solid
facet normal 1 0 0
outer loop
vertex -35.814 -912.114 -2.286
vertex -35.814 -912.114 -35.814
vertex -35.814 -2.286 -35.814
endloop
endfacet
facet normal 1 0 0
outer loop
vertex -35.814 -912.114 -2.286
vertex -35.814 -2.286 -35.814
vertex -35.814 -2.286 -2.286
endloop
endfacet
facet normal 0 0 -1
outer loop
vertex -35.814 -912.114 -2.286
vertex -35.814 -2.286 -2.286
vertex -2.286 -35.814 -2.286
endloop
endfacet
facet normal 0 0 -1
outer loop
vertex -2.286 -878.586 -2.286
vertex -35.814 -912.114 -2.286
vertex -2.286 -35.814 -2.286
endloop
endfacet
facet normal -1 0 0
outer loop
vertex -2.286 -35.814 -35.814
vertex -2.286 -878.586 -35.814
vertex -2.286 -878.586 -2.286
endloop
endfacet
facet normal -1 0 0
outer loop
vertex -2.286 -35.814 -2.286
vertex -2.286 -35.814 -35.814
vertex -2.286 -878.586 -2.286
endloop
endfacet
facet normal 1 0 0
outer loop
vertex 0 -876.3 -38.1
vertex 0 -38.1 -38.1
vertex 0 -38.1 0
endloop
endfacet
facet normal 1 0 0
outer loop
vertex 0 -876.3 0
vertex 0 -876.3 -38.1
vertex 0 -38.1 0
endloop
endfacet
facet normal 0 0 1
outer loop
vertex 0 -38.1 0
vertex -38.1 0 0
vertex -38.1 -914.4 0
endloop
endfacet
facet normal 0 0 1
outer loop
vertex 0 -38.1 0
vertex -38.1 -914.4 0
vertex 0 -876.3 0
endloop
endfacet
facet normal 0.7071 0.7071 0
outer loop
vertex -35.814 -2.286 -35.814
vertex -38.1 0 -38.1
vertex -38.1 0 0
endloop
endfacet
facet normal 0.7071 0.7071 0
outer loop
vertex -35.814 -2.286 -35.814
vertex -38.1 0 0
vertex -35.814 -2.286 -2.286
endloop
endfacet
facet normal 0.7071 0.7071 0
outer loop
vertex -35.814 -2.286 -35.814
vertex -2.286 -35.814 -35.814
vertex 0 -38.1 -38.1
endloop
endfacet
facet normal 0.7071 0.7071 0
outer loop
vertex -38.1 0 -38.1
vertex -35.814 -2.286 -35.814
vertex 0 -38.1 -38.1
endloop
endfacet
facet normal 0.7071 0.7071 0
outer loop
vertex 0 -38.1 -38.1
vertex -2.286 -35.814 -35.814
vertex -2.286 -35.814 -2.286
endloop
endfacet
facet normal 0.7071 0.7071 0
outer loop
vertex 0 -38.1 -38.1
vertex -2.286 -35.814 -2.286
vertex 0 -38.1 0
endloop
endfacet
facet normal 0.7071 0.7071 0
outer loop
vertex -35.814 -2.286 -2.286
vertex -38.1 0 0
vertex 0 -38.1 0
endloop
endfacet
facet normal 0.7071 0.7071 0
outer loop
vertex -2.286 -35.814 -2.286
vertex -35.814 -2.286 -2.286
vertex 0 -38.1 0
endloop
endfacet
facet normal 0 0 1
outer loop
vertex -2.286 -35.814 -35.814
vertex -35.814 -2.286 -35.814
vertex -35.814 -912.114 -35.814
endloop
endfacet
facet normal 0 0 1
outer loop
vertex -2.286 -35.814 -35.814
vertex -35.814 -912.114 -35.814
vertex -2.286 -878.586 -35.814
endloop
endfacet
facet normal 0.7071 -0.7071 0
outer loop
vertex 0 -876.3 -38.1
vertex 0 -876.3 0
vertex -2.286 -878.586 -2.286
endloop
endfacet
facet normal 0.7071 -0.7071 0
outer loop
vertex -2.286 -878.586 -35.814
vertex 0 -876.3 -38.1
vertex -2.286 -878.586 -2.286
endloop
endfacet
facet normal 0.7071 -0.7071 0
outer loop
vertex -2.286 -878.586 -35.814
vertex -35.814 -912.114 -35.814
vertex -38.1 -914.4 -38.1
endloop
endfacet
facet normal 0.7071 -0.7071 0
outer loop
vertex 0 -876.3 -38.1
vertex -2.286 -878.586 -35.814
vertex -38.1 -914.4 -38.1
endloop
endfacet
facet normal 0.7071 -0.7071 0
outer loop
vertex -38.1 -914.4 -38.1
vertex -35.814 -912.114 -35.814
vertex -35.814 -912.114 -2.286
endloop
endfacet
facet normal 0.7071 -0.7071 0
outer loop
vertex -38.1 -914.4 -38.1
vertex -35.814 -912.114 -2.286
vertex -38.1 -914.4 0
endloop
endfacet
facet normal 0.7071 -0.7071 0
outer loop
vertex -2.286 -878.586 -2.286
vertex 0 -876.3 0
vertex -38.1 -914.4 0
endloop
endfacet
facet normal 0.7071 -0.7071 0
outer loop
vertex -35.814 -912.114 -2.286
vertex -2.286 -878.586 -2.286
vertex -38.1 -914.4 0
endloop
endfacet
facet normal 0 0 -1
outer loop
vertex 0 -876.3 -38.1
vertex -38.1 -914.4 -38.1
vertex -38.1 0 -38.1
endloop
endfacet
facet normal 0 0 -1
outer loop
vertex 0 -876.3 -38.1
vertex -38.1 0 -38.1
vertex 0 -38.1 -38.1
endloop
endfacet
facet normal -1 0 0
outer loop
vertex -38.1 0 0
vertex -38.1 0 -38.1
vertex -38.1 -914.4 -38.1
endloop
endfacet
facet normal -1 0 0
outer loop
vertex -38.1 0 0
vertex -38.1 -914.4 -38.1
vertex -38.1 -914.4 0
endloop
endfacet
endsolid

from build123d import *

# Parameters (mm, degrees)
F0_W     = 38.1
F0_H     = 38.1
F0_W_2   = 33.528
F0_H_2   = 33.528
F1_DEPTH = 914.4
F3_DEPTH = 50.8


with BuildPart() as f1:
    # F0 (on Front) → F1 (new body)
    with BuildSketch(Plane.XZ):
        with Locations((-19.05, -19.05)):
            Rectangle(F0_W, F0_H)
        with Locations((-19.05, -19.05)):
            Rectangle(F0_W_2, F0_H_2, mode=Mode.SUBTRACT)
    extrude(amount=F1_DEPTH)

    # F2 (on face) → F3 (cut)
    with BuildSketch(Plane.XY):
        Polygon((0, -876.3), (-38.1, -914.4), (0, -914.4), align=None)
        Polygon((0, 0), (-38.1, 0), (0, -38.1), align=None)
    extrude(amount=-F3_DEPTH, mode=Mode.SUBTRACT)


solid = f1.part
